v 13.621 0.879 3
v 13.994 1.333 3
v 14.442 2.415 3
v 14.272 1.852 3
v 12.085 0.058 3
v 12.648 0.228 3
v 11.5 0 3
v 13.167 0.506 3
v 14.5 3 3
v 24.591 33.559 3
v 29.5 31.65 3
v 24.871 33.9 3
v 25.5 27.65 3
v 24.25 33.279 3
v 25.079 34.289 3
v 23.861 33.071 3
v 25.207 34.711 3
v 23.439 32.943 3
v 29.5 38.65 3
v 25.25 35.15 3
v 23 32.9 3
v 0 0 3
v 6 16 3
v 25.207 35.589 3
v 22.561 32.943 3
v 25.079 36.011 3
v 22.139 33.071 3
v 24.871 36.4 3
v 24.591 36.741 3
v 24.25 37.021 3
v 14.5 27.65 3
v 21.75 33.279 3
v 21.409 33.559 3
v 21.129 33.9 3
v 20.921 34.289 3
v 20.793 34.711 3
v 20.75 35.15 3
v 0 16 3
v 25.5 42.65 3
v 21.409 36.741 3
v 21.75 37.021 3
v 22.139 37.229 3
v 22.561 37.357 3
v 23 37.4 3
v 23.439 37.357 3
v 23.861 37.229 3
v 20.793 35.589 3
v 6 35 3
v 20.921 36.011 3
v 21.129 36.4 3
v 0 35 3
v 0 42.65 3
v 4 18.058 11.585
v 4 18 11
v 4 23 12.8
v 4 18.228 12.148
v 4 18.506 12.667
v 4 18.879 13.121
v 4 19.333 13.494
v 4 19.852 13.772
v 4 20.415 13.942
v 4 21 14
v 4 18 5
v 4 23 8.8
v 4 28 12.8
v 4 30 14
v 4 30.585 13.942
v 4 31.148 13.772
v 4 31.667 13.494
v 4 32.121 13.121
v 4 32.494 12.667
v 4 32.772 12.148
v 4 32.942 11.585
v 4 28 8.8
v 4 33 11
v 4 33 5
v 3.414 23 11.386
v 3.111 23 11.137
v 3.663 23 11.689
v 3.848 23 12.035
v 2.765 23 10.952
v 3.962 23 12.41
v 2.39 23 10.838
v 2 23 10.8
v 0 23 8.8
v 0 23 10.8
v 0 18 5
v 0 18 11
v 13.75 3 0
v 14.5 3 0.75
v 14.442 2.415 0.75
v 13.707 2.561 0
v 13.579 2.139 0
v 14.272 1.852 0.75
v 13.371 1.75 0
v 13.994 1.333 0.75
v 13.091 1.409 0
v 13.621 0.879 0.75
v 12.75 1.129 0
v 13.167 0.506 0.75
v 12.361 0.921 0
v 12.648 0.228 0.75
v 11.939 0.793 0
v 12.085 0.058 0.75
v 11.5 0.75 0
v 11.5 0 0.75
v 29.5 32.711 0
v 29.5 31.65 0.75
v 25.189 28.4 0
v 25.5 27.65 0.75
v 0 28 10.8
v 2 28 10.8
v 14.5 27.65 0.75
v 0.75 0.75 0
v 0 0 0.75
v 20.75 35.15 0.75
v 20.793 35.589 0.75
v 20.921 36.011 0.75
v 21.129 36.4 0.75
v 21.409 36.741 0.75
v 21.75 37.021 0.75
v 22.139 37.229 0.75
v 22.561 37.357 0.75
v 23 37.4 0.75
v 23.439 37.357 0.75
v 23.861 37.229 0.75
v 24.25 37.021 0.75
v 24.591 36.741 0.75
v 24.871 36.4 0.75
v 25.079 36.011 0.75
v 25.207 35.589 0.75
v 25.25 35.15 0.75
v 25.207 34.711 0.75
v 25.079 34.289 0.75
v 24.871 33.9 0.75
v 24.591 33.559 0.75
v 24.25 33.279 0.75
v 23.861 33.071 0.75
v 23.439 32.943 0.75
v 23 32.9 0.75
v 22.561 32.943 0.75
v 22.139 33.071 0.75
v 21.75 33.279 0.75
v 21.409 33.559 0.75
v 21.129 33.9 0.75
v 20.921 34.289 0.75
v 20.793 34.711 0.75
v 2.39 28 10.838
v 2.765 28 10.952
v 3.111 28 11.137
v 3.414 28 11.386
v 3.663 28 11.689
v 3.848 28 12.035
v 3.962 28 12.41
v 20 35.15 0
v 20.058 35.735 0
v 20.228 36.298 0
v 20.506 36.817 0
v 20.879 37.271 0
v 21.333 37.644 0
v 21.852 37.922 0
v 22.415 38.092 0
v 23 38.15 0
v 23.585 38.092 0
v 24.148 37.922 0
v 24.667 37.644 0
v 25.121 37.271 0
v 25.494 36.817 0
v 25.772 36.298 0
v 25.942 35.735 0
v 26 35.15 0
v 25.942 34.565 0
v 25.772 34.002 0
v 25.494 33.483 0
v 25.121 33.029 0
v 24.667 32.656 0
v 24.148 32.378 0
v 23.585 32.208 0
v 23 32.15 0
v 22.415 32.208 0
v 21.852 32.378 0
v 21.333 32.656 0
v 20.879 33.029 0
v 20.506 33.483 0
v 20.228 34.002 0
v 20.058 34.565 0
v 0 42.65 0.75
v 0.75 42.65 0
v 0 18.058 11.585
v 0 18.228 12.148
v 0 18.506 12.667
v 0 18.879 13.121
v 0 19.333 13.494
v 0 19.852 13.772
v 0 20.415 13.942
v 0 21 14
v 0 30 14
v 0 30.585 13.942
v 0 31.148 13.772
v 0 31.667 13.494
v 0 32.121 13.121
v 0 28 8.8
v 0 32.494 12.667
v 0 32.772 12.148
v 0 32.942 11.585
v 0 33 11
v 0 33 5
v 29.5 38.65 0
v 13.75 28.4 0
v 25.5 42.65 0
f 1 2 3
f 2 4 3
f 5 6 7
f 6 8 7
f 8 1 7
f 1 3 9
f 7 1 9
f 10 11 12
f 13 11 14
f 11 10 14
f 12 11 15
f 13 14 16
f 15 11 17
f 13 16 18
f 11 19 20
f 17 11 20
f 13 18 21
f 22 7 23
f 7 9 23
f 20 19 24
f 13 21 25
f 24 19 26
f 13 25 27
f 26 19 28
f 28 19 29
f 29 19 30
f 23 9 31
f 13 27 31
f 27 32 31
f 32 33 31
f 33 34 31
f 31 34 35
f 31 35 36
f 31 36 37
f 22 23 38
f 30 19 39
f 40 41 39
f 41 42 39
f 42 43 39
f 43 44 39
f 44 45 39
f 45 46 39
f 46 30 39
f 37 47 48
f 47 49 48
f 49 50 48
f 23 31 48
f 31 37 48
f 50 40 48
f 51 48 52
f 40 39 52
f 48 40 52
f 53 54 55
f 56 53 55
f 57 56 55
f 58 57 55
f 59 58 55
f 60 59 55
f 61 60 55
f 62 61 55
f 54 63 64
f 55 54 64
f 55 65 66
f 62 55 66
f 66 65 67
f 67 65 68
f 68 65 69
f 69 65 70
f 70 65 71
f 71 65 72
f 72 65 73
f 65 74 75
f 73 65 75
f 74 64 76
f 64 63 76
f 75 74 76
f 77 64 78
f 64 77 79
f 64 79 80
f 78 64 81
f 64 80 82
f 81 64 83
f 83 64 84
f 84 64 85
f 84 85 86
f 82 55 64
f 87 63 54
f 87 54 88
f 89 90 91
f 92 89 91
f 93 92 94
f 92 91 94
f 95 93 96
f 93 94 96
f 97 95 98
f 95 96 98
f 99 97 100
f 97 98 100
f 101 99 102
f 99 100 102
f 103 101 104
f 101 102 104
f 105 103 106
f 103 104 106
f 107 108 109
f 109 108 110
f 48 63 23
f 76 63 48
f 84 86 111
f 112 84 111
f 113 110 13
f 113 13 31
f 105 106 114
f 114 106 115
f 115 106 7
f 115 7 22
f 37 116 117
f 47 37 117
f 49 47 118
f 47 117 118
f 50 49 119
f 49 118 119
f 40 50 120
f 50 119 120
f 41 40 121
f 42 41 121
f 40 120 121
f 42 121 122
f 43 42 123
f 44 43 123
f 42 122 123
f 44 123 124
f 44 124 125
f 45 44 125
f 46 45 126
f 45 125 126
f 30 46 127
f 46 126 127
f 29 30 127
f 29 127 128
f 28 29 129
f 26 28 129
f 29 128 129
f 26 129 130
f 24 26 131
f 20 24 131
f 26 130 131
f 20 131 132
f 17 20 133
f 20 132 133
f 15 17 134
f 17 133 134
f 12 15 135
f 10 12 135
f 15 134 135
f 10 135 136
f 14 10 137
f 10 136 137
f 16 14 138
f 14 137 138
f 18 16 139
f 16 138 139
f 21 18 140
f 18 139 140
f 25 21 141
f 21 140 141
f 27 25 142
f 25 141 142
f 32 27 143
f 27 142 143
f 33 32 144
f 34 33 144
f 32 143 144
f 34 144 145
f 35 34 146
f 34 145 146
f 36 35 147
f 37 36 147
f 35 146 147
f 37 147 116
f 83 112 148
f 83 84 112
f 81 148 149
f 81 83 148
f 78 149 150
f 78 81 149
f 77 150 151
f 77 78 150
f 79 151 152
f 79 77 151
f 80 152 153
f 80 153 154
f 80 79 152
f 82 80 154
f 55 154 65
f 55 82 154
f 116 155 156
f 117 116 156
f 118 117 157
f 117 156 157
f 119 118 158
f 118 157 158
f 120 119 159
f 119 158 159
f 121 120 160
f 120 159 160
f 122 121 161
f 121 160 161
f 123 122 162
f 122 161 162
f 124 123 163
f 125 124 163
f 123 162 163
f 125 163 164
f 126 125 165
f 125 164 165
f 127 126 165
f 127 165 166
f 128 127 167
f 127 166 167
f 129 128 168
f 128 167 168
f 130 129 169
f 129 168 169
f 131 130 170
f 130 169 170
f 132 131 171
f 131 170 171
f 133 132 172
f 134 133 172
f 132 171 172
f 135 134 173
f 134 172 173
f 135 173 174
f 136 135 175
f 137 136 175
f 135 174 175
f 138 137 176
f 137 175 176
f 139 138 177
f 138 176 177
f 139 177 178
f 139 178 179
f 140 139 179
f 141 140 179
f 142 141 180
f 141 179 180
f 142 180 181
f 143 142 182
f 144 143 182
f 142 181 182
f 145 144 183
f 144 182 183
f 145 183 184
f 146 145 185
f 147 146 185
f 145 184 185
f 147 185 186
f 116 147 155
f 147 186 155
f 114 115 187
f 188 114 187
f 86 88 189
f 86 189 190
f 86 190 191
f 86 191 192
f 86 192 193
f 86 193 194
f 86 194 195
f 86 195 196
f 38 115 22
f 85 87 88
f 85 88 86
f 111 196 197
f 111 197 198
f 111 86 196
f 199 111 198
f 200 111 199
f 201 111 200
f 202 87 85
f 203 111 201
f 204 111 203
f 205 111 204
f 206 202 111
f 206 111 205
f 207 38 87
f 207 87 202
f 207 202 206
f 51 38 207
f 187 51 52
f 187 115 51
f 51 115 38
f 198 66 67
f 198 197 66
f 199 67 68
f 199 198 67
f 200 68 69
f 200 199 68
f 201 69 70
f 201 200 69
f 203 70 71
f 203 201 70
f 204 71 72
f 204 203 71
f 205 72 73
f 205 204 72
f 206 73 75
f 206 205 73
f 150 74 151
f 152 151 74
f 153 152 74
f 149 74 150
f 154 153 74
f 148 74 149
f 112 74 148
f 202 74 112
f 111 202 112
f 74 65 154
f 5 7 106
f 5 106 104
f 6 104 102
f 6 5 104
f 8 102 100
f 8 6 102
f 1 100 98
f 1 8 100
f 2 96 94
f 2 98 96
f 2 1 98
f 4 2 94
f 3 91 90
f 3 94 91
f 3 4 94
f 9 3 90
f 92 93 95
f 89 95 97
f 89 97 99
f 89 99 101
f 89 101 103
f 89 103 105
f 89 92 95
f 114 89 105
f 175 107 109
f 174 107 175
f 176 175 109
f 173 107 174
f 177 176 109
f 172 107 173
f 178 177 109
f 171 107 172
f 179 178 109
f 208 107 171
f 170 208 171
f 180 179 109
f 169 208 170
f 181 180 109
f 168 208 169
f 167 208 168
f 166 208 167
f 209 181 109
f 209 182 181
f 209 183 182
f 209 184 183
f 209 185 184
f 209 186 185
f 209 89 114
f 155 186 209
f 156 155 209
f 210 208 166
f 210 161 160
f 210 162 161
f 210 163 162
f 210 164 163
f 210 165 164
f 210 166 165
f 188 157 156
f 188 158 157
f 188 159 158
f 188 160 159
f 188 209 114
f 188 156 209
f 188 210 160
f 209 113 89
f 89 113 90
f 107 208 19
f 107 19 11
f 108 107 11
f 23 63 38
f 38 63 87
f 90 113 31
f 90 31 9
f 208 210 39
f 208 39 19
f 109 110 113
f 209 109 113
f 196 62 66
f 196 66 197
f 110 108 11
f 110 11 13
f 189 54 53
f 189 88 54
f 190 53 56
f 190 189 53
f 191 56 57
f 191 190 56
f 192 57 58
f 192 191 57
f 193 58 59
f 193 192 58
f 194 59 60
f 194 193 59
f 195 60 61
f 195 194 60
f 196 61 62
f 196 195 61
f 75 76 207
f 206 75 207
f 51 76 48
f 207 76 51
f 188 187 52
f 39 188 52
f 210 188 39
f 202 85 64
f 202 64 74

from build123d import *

# Parameters (mm, degrees)
SKETCH_R        = 2.25
PAD_DEPTH       = 3
SKETCH001_W     = 4
SKETCH001_H     = 15
PAD001_DEPTH    = 11
SKETCH002_W     = 5
SKETCH002_H     = 2
POCKET_DEPTH    = 29.501
FILLET_R        = 3
FILLET001_R     = 2
CHAMFER_SIZE    = 0.75
CHAMFER001_SIZE = 2


with BuildPart() as chamfer001:
    # Sketch → Pad (new body)
    with BuildSketch(Plane.XY):
        Polygon((0, 42.65), (-25.5, 42.65), (-29.5, 38.65), (-29.5, 31.65), (-25.5, 27.65), (-14.5, 27.65), (-14.5, 0), (0, 0), align=None)
        with Locations((-23, 35.15)):
            Circle(SKETCH_R, mode=Mode.SUBTRACT)
    extrude(amount=PAD_DEPTH)

    # Sketch001 → Pad001 (new body)
    with BuildSketch(Plane.XY.offset(3)):
        with Locations((-2, 25.5)):
            Rectangle(SKETCH001_W, SKETCH001_H)
    extrude(amount=PAD001_DEPTH)

    # Sketch002 → Pocket (cut, through all)
    with BuildSketch(Plane.YZ):
        with Locations((25.5, 9.8)):
            Rectangle(SKETCH002_W, SKETCH002_H)
    extrude(amount=-POCKET_DEPTH, mode=Mode.SUBTRACT)

    # Fillet
    fillet_edges = [chamfer001.edges().sort_by_distance(p)[0] for p in [
        (-2, 18, 14),
        (-2, 33, 14),
        (-14.5, 0, 1.5),
    ]]
    fillet(fillet_edges, radius=FILLET_R)

    # Fillet001
    fillet001_edges = [chamfer001.edges().sort_by_distance(p)[0] for p in [
        (-4, 25.5, 10.8),
    ]]
    fillet(fillet001_edges, radius=FILLET001_R)

    # Chamfer
    chamfer_edges = [chamfer001.edges().sort_by_distance(p)[0] for p in [
        (0, 21.325, 0),
        (-5.75, 0, 0),
        (-13.62132, 0.87868, 0),
        (-14.5, 15.325, 0),
        (-20, 27.65, 0),
        (-27.5, 29.65, 0),
        (-25.25, 35.15, 0),
    ]]
    chamfer(chamfer_edges, length=CHAMFER_SIZE)

    # Chamfer001
    chamfer001_edges = [chamfer001.edges().sort_by_distance(p)[0] for p in [
        (-2, 18, 3),
        (-4, 25.5, 3),
        (-2, 33, 3),
    ]]
    chamfer(chamfer001_edges, length=CHAMFER001_SIZE)


with BuildPart() as part_mirroring:
    # Part__Mirroring: instance of Chamfer001
    add(chamfer001.part.mirror(Plane(origin=(0, 0, 0), x_dir=(0, -1, 0), z_dir=(1, 0, 0))))


solid = part_mirroring.part
